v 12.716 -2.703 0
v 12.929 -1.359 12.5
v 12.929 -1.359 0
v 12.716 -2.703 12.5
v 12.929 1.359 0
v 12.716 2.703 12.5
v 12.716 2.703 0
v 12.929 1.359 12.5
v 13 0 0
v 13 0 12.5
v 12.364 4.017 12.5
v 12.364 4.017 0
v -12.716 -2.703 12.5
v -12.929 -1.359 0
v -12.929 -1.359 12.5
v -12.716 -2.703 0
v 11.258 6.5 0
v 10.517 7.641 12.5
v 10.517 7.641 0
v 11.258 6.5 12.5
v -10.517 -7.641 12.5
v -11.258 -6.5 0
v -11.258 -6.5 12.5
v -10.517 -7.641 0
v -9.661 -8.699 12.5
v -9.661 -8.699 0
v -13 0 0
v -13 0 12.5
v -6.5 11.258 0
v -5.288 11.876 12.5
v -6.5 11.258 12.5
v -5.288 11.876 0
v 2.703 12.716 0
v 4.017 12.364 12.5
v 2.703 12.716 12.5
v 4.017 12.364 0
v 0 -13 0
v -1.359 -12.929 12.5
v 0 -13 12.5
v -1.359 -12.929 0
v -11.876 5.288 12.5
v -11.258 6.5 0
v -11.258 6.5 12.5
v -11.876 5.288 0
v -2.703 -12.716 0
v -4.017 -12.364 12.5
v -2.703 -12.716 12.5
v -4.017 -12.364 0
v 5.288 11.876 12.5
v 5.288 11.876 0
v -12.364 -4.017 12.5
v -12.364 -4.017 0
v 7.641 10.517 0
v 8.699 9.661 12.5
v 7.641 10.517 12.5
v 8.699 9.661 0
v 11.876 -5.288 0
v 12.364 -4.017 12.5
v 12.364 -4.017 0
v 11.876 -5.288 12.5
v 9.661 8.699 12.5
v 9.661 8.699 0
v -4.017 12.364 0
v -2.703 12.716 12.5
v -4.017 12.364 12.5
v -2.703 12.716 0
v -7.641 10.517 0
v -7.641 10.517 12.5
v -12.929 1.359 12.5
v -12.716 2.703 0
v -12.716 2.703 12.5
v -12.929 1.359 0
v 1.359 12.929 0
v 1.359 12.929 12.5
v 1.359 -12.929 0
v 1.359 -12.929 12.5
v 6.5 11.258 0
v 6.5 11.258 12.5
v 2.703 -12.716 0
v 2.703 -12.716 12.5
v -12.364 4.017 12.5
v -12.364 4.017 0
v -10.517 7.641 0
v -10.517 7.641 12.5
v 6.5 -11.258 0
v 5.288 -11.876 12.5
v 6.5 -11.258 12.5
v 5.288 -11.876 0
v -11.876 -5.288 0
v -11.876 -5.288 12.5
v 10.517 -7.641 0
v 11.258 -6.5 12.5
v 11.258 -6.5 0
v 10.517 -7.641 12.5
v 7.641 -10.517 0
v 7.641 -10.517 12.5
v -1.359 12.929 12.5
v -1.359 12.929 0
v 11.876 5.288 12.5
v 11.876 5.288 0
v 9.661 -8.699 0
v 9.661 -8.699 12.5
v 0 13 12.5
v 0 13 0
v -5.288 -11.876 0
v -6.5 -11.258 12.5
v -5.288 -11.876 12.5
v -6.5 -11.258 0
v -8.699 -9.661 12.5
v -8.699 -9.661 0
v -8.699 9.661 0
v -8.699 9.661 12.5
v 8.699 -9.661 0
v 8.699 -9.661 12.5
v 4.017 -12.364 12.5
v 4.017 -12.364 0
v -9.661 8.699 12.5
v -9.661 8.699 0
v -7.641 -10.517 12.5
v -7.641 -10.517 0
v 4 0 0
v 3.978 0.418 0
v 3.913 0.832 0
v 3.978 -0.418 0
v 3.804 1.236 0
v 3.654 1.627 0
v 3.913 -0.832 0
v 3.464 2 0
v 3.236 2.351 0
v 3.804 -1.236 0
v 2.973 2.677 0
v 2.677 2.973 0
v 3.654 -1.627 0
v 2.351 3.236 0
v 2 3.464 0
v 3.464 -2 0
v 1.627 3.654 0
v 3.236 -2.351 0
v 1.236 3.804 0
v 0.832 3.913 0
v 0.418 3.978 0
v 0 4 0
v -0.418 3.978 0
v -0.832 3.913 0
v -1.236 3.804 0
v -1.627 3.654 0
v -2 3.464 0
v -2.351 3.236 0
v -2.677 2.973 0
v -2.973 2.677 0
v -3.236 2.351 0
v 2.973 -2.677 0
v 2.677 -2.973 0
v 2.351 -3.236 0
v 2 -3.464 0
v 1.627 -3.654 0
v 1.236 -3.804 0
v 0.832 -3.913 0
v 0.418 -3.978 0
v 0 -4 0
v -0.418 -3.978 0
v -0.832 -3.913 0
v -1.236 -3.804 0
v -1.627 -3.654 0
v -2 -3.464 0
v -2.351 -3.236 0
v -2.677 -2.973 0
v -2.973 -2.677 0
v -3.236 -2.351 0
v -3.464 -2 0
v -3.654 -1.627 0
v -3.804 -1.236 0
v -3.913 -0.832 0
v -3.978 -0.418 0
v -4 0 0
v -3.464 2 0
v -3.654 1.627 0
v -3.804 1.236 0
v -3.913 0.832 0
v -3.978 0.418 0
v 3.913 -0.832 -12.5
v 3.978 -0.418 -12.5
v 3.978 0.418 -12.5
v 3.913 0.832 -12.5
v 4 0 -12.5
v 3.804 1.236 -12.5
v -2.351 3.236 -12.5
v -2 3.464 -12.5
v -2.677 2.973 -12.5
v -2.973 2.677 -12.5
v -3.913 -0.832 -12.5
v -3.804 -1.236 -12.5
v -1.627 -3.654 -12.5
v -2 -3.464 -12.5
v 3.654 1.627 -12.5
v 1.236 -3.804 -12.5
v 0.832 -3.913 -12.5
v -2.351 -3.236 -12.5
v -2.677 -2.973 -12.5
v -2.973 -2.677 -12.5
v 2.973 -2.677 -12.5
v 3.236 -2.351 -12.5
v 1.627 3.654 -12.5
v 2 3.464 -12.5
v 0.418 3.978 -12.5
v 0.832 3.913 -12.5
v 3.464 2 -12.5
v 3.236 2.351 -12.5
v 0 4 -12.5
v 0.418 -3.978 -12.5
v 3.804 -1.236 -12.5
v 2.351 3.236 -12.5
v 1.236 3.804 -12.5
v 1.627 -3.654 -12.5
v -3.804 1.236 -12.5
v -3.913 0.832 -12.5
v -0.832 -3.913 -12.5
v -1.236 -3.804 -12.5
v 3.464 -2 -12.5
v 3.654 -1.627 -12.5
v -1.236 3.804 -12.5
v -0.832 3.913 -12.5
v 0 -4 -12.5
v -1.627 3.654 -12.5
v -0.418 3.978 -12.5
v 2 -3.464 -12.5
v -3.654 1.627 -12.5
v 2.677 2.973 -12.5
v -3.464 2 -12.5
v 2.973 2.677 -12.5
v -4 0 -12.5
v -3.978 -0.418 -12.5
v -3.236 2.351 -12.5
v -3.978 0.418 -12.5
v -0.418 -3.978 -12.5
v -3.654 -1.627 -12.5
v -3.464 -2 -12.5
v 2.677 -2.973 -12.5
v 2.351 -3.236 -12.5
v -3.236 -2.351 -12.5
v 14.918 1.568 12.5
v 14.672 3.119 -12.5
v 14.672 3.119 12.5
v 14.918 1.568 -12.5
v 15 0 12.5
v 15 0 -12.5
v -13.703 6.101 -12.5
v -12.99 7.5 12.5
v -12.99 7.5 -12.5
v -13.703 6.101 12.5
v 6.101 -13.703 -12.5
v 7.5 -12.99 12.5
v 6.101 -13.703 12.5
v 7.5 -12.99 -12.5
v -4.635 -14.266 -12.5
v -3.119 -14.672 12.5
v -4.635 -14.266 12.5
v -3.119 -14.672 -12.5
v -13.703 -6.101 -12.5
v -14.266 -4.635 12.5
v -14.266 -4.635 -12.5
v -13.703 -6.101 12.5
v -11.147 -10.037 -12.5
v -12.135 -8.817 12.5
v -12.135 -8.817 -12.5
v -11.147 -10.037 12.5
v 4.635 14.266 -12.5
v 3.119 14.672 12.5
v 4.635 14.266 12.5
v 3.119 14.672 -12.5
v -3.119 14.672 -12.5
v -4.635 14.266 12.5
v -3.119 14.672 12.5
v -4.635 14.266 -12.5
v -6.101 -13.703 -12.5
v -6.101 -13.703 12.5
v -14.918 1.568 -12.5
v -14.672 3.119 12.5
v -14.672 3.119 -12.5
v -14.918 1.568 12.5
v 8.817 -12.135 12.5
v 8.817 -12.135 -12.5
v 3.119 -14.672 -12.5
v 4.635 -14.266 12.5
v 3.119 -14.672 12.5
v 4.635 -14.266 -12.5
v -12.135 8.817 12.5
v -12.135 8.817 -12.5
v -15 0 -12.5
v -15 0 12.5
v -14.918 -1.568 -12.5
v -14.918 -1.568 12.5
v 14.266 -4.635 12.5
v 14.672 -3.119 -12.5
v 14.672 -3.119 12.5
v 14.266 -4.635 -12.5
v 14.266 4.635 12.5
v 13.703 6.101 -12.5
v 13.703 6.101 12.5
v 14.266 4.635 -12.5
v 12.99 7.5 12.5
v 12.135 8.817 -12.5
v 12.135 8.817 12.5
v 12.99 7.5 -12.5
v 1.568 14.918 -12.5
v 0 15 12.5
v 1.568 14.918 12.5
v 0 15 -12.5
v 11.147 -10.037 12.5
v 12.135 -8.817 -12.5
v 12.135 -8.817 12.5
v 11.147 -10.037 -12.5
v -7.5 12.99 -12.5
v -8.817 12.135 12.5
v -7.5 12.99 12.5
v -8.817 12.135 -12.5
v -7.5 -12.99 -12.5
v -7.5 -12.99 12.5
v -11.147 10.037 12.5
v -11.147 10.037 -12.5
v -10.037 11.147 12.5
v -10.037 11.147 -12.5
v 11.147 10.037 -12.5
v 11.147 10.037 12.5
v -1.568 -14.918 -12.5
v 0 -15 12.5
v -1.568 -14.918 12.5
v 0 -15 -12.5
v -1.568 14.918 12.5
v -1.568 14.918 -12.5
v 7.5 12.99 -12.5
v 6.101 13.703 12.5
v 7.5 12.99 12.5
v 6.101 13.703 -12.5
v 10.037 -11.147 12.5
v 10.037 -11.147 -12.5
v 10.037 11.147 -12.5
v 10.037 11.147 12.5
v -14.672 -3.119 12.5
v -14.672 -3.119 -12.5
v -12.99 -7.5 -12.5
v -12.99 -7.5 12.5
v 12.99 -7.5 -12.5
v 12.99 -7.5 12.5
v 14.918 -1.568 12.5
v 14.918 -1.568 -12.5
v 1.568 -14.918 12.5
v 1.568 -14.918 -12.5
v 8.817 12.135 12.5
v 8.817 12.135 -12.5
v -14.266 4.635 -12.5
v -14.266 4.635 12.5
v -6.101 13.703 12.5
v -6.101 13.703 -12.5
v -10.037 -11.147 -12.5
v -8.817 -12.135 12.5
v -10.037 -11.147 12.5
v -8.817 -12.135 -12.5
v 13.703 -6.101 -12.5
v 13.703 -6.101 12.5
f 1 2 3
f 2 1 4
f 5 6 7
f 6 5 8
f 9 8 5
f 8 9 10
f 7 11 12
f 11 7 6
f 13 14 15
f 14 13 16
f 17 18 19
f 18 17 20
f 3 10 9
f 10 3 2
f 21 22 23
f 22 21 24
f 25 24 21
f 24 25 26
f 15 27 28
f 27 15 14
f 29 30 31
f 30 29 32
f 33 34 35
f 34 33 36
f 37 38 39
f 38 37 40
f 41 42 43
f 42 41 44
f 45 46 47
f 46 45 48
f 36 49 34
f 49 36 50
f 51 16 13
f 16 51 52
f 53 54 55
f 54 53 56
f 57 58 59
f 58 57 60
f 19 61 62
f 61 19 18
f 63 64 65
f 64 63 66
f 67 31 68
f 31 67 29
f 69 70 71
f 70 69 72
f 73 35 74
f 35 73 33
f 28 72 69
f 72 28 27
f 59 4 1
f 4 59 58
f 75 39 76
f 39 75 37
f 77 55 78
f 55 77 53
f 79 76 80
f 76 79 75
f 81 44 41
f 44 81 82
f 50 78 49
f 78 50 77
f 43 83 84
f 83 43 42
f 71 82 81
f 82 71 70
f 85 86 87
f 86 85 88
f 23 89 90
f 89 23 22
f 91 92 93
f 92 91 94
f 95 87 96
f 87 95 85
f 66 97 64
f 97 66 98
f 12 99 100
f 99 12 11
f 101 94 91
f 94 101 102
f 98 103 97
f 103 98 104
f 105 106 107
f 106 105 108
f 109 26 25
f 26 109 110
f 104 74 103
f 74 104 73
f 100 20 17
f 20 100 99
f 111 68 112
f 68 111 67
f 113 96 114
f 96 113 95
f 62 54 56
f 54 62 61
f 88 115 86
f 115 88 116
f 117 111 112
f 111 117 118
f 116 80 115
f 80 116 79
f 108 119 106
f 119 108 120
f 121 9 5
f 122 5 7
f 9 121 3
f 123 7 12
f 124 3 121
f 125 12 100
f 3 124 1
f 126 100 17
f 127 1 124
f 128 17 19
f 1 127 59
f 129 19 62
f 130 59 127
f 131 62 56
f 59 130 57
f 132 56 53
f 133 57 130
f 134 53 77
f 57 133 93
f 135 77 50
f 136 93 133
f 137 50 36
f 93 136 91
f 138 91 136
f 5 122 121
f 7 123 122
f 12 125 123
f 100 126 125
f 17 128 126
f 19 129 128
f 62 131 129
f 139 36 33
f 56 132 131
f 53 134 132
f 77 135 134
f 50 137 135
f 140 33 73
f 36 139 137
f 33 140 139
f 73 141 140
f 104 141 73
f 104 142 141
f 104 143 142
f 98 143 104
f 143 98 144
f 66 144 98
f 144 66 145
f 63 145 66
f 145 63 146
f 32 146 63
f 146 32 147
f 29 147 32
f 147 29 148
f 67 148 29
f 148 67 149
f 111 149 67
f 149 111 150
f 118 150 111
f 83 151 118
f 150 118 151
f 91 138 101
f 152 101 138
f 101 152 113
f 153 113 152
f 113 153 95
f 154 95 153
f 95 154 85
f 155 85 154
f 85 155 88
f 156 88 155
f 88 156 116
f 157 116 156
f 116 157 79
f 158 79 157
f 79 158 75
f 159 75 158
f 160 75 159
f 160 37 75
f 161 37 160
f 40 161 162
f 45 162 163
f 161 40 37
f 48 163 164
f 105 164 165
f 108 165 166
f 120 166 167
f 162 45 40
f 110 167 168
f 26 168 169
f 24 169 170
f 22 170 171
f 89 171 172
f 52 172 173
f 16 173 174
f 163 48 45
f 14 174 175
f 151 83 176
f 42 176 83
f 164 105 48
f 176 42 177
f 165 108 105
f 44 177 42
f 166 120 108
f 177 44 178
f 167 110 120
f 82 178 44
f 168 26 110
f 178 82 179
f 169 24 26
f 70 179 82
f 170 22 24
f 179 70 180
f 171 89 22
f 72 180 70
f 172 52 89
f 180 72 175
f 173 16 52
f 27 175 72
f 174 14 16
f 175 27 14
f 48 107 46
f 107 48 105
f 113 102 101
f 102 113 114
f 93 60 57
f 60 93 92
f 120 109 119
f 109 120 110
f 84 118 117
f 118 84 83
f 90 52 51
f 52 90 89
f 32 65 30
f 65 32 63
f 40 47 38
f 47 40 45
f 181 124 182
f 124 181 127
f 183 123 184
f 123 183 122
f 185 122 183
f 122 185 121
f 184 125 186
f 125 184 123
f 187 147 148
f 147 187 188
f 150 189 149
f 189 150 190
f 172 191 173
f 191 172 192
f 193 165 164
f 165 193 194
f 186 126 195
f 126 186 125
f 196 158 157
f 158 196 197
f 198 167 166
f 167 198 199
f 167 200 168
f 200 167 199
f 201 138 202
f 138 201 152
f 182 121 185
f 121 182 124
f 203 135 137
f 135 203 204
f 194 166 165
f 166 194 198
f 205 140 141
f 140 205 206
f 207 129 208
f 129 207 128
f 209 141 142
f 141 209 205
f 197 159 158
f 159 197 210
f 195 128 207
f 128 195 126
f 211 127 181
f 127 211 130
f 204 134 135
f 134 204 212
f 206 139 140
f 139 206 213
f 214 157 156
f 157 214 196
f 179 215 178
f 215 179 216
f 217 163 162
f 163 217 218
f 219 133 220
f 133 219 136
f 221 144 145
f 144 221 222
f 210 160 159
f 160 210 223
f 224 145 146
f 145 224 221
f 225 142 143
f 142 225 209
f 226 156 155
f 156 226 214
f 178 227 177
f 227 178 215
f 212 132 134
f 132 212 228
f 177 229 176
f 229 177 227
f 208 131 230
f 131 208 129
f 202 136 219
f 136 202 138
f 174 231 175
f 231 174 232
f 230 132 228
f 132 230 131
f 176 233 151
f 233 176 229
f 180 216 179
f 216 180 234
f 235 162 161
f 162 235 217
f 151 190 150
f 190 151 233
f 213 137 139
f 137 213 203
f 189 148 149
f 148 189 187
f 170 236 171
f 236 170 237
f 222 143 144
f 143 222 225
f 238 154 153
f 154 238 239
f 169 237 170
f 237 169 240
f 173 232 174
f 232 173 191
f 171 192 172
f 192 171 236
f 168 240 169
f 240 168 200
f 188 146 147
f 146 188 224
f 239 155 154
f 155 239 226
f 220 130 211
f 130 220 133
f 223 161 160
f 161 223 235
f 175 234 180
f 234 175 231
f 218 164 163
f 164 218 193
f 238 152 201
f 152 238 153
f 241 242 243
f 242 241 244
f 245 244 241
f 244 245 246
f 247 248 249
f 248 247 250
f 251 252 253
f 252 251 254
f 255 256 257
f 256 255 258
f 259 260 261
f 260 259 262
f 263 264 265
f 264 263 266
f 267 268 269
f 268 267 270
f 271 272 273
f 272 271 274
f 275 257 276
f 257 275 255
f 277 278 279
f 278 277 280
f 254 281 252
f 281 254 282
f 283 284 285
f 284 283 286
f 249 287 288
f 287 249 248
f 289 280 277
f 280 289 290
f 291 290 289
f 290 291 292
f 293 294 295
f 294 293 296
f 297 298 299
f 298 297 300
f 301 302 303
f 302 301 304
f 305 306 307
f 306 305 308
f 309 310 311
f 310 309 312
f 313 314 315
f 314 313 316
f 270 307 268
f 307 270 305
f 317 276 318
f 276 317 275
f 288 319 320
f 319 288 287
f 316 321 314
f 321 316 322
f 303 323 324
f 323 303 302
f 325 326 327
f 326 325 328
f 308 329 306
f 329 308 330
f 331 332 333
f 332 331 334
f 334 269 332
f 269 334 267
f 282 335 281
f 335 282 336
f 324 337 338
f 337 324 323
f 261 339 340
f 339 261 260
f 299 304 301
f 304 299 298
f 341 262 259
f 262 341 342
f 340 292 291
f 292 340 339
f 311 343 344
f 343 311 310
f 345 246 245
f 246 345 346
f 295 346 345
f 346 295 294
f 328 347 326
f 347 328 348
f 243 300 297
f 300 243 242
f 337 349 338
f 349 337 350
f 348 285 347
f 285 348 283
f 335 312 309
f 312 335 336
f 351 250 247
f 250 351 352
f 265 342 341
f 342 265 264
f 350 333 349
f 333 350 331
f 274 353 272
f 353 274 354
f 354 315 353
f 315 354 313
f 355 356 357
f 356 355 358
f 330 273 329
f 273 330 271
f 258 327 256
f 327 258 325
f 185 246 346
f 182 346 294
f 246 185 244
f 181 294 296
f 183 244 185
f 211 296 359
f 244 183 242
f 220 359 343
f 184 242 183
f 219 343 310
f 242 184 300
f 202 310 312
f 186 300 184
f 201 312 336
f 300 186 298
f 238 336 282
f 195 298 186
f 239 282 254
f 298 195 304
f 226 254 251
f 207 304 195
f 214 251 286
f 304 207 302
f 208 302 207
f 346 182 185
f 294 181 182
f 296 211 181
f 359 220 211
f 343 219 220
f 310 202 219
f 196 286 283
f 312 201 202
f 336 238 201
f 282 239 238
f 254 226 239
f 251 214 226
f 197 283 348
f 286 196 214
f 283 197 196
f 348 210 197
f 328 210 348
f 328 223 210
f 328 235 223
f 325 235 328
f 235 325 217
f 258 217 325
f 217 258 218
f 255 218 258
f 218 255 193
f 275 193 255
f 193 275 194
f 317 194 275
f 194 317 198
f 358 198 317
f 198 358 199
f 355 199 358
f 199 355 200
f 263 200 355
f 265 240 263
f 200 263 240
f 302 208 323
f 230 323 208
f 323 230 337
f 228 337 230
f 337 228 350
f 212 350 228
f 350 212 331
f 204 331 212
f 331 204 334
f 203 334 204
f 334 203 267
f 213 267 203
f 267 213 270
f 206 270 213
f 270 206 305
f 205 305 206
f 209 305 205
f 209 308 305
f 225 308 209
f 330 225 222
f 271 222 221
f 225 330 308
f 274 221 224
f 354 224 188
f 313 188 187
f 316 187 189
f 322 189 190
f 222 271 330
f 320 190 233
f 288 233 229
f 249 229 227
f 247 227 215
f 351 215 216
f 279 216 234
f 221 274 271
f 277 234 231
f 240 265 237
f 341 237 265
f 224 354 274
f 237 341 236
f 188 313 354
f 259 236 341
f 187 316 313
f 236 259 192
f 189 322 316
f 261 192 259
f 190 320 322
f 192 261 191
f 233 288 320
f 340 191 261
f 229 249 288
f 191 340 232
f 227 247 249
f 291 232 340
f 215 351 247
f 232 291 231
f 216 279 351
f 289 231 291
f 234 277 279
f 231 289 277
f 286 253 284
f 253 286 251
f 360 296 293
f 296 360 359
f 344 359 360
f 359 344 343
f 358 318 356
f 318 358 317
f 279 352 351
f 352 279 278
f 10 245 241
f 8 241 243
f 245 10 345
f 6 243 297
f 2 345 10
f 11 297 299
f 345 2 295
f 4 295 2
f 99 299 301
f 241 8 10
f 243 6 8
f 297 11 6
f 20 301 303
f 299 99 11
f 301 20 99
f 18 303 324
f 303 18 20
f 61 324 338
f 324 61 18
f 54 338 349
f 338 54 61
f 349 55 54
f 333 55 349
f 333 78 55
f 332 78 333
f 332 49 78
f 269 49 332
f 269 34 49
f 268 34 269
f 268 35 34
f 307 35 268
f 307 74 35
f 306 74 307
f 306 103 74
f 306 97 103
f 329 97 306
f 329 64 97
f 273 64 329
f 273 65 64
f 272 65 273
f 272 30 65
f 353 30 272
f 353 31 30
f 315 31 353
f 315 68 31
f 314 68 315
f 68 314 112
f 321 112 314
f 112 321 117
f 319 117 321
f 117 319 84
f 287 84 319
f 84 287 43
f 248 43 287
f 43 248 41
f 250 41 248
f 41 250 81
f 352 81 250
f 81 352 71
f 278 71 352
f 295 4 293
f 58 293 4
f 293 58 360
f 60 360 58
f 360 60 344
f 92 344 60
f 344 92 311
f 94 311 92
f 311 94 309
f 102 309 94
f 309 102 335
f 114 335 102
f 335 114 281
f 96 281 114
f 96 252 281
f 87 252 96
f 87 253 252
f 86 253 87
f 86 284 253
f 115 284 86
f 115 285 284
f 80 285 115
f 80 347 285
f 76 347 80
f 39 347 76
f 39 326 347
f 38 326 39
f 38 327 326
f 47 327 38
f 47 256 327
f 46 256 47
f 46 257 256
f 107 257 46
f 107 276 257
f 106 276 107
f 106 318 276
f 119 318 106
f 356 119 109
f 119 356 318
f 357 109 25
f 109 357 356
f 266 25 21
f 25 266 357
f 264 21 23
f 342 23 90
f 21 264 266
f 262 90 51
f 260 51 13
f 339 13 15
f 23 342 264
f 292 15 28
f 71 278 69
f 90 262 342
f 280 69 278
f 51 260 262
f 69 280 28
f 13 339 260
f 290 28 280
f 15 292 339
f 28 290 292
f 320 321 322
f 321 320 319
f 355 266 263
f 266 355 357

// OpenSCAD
//CUSTOMIZER VARIABLES
//bit radius mm
bit_radius=4; 
//rod radius mm
rod_radius=13; 
//CUSTOMIZER VARIABLES END

difference(){
    cylinder(h=25,$fn=60,r=rod_radius+2,center=true);
    union(){
        translate([0,0,6.5])cylinder(h=13, $fn=60, r=rod_radius, center=true);
        translate([0,0,-6.5])cylinder(h=14, $fn=60, r=bit_radius, center=true);
    }
}
